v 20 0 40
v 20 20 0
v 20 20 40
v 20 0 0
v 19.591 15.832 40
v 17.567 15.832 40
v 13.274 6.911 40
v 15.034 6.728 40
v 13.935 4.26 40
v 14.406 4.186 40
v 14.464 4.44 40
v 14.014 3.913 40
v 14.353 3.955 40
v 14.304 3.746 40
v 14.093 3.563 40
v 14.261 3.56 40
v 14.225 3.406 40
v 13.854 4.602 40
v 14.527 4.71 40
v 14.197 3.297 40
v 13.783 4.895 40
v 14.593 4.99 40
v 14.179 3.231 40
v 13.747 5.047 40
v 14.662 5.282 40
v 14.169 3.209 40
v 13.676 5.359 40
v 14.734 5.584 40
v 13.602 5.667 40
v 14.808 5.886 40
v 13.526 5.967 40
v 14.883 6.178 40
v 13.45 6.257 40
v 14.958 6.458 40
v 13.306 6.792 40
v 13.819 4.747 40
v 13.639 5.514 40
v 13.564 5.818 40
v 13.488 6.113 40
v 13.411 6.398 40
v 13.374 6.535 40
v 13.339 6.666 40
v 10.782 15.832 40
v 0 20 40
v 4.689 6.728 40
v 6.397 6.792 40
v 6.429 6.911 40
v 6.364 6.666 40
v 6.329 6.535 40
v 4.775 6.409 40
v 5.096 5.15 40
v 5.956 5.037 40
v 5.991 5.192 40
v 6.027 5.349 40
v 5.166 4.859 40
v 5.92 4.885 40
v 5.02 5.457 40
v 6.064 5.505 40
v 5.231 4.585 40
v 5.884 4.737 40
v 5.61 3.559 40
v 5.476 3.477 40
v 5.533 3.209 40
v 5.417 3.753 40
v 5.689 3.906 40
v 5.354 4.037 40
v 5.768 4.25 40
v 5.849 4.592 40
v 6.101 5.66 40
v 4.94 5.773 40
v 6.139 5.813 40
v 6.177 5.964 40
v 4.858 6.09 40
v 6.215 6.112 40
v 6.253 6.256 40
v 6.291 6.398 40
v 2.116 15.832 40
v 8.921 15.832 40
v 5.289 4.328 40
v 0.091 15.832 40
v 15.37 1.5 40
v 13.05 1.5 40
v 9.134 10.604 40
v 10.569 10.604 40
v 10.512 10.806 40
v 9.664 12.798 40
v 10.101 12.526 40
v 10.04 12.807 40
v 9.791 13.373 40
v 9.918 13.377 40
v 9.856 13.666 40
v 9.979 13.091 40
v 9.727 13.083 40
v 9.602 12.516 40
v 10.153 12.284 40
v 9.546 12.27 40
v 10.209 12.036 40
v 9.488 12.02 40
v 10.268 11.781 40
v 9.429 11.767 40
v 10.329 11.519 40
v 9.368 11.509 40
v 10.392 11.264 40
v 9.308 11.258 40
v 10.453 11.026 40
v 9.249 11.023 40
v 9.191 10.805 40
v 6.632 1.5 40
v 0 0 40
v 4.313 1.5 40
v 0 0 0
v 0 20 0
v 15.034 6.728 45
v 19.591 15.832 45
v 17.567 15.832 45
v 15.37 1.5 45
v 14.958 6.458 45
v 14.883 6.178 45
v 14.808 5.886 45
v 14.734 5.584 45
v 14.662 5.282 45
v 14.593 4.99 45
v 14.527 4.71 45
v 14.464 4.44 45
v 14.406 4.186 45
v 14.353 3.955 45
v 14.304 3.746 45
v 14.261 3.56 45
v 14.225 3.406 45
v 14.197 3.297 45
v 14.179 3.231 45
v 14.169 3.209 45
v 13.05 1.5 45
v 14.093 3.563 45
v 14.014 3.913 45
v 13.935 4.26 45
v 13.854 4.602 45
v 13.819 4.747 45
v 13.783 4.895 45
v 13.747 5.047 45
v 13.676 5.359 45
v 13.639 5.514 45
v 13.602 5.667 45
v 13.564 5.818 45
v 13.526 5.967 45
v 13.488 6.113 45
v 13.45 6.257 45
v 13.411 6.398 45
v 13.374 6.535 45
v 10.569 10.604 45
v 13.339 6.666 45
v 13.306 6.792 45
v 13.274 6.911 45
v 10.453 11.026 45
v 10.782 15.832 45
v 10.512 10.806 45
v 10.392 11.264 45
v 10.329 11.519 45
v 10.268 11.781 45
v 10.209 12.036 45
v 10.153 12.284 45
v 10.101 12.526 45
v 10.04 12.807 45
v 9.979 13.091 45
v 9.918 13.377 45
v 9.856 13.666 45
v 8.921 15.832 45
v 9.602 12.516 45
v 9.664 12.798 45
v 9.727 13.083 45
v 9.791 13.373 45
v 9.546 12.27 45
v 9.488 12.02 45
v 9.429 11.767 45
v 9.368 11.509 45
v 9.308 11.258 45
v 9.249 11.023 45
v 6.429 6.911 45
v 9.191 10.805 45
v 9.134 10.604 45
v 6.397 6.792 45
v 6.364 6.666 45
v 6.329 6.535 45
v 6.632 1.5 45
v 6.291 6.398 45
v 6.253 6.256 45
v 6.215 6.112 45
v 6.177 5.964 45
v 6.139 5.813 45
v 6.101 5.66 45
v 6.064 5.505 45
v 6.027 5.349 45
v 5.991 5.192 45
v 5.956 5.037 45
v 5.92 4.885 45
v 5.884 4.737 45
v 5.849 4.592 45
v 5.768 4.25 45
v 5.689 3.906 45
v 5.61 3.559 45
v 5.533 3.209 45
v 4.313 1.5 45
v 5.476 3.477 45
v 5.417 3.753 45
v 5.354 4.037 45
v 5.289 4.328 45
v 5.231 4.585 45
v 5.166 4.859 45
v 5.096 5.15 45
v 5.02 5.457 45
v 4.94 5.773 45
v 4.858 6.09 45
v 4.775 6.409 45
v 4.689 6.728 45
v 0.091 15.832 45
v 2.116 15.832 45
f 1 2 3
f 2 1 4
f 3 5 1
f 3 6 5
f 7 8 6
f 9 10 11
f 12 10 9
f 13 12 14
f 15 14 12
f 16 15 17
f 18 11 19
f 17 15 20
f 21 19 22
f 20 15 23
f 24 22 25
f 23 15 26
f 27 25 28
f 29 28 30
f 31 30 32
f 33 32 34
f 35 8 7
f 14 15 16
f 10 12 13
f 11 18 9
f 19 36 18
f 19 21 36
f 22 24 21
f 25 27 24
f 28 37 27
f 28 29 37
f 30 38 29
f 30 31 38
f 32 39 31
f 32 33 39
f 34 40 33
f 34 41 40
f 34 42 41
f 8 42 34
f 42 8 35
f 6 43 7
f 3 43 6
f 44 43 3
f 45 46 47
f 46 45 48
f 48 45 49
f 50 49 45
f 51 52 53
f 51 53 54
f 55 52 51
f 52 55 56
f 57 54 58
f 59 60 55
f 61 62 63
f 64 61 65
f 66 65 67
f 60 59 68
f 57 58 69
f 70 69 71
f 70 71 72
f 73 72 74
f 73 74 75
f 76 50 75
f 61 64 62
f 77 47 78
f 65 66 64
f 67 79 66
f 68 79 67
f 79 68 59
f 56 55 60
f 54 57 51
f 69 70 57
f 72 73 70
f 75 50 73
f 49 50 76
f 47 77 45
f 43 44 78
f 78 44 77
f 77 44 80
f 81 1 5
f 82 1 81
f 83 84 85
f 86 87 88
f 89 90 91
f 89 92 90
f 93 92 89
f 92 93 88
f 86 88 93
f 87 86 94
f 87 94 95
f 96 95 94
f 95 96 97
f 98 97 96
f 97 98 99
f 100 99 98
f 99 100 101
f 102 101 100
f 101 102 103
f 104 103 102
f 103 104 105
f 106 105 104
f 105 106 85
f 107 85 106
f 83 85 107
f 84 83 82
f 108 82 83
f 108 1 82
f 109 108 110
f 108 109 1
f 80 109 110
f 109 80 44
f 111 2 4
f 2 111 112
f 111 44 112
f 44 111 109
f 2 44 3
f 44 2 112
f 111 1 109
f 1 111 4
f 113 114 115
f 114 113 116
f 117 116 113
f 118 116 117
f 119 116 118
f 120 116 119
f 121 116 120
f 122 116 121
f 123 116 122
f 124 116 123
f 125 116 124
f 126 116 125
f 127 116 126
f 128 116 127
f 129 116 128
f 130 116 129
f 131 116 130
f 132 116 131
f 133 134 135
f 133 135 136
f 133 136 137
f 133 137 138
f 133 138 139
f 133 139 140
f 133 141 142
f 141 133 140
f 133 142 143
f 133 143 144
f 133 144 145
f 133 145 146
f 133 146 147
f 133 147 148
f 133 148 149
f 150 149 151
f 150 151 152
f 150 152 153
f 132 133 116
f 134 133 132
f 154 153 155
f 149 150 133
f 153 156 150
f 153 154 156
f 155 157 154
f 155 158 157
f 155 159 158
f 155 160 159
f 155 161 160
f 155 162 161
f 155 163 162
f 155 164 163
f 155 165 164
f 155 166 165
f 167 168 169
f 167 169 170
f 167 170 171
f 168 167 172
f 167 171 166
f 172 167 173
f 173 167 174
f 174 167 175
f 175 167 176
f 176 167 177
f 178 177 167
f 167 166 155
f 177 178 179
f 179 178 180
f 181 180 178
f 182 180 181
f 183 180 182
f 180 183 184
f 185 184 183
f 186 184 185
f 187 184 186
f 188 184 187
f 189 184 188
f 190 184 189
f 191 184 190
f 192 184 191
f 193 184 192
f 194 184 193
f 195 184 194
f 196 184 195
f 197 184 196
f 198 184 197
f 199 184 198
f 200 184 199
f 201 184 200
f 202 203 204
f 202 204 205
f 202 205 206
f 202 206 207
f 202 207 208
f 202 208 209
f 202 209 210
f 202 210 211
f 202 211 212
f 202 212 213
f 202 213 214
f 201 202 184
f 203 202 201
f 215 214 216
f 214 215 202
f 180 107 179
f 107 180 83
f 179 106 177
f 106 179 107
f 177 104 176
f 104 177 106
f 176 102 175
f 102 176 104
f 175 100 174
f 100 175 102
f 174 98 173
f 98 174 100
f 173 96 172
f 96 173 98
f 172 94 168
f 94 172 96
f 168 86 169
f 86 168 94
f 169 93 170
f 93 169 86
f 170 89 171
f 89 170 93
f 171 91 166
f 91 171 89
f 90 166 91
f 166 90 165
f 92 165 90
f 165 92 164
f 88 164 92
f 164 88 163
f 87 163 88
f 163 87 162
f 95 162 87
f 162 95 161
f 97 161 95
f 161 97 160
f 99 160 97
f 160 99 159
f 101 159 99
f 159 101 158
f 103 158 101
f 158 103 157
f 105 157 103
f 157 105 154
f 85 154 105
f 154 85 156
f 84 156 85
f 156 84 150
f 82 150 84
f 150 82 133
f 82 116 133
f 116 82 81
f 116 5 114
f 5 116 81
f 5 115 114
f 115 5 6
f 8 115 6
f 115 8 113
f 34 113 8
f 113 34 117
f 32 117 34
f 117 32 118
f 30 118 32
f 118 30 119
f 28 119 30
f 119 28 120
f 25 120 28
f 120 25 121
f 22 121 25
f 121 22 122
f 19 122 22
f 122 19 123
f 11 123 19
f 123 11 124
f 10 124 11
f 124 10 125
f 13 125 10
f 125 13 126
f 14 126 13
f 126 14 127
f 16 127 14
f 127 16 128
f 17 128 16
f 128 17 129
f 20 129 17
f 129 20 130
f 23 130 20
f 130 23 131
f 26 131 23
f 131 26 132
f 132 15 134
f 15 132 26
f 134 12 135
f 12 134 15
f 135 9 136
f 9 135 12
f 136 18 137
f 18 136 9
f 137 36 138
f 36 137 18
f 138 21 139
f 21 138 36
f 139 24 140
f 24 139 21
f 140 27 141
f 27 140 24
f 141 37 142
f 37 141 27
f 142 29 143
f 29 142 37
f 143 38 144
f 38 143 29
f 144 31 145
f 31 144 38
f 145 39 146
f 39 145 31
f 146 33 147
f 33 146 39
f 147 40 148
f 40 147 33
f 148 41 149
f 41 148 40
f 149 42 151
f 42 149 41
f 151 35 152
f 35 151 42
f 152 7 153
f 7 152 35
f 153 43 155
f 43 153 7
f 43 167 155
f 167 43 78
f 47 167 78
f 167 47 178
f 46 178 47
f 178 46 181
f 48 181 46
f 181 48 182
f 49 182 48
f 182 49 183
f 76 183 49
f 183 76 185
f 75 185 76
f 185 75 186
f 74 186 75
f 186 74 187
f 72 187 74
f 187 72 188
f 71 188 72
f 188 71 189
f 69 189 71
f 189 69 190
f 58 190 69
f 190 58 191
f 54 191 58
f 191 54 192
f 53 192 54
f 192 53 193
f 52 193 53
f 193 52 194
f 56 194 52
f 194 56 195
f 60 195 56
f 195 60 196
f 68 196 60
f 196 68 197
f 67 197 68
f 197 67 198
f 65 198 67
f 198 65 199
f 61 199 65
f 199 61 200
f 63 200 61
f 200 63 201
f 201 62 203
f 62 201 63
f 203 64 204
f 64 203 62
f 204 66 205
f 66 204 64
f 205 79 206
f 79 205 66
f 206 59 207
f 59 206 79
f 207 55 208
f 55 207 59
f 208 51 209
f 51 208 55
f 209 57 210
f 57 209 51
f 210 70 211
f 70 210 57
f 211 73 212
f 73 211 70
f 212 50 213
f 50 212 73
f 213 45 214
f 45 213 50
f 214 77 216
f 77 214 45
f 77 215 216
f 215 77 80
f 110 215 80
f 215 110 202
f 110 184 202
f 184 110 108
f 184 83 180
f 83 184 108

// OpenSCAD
cube([20, 20, 40]);
translate([0, 1.5, 40]){
    linear_extrude(5){
        text("W", size=15);
    }
}
